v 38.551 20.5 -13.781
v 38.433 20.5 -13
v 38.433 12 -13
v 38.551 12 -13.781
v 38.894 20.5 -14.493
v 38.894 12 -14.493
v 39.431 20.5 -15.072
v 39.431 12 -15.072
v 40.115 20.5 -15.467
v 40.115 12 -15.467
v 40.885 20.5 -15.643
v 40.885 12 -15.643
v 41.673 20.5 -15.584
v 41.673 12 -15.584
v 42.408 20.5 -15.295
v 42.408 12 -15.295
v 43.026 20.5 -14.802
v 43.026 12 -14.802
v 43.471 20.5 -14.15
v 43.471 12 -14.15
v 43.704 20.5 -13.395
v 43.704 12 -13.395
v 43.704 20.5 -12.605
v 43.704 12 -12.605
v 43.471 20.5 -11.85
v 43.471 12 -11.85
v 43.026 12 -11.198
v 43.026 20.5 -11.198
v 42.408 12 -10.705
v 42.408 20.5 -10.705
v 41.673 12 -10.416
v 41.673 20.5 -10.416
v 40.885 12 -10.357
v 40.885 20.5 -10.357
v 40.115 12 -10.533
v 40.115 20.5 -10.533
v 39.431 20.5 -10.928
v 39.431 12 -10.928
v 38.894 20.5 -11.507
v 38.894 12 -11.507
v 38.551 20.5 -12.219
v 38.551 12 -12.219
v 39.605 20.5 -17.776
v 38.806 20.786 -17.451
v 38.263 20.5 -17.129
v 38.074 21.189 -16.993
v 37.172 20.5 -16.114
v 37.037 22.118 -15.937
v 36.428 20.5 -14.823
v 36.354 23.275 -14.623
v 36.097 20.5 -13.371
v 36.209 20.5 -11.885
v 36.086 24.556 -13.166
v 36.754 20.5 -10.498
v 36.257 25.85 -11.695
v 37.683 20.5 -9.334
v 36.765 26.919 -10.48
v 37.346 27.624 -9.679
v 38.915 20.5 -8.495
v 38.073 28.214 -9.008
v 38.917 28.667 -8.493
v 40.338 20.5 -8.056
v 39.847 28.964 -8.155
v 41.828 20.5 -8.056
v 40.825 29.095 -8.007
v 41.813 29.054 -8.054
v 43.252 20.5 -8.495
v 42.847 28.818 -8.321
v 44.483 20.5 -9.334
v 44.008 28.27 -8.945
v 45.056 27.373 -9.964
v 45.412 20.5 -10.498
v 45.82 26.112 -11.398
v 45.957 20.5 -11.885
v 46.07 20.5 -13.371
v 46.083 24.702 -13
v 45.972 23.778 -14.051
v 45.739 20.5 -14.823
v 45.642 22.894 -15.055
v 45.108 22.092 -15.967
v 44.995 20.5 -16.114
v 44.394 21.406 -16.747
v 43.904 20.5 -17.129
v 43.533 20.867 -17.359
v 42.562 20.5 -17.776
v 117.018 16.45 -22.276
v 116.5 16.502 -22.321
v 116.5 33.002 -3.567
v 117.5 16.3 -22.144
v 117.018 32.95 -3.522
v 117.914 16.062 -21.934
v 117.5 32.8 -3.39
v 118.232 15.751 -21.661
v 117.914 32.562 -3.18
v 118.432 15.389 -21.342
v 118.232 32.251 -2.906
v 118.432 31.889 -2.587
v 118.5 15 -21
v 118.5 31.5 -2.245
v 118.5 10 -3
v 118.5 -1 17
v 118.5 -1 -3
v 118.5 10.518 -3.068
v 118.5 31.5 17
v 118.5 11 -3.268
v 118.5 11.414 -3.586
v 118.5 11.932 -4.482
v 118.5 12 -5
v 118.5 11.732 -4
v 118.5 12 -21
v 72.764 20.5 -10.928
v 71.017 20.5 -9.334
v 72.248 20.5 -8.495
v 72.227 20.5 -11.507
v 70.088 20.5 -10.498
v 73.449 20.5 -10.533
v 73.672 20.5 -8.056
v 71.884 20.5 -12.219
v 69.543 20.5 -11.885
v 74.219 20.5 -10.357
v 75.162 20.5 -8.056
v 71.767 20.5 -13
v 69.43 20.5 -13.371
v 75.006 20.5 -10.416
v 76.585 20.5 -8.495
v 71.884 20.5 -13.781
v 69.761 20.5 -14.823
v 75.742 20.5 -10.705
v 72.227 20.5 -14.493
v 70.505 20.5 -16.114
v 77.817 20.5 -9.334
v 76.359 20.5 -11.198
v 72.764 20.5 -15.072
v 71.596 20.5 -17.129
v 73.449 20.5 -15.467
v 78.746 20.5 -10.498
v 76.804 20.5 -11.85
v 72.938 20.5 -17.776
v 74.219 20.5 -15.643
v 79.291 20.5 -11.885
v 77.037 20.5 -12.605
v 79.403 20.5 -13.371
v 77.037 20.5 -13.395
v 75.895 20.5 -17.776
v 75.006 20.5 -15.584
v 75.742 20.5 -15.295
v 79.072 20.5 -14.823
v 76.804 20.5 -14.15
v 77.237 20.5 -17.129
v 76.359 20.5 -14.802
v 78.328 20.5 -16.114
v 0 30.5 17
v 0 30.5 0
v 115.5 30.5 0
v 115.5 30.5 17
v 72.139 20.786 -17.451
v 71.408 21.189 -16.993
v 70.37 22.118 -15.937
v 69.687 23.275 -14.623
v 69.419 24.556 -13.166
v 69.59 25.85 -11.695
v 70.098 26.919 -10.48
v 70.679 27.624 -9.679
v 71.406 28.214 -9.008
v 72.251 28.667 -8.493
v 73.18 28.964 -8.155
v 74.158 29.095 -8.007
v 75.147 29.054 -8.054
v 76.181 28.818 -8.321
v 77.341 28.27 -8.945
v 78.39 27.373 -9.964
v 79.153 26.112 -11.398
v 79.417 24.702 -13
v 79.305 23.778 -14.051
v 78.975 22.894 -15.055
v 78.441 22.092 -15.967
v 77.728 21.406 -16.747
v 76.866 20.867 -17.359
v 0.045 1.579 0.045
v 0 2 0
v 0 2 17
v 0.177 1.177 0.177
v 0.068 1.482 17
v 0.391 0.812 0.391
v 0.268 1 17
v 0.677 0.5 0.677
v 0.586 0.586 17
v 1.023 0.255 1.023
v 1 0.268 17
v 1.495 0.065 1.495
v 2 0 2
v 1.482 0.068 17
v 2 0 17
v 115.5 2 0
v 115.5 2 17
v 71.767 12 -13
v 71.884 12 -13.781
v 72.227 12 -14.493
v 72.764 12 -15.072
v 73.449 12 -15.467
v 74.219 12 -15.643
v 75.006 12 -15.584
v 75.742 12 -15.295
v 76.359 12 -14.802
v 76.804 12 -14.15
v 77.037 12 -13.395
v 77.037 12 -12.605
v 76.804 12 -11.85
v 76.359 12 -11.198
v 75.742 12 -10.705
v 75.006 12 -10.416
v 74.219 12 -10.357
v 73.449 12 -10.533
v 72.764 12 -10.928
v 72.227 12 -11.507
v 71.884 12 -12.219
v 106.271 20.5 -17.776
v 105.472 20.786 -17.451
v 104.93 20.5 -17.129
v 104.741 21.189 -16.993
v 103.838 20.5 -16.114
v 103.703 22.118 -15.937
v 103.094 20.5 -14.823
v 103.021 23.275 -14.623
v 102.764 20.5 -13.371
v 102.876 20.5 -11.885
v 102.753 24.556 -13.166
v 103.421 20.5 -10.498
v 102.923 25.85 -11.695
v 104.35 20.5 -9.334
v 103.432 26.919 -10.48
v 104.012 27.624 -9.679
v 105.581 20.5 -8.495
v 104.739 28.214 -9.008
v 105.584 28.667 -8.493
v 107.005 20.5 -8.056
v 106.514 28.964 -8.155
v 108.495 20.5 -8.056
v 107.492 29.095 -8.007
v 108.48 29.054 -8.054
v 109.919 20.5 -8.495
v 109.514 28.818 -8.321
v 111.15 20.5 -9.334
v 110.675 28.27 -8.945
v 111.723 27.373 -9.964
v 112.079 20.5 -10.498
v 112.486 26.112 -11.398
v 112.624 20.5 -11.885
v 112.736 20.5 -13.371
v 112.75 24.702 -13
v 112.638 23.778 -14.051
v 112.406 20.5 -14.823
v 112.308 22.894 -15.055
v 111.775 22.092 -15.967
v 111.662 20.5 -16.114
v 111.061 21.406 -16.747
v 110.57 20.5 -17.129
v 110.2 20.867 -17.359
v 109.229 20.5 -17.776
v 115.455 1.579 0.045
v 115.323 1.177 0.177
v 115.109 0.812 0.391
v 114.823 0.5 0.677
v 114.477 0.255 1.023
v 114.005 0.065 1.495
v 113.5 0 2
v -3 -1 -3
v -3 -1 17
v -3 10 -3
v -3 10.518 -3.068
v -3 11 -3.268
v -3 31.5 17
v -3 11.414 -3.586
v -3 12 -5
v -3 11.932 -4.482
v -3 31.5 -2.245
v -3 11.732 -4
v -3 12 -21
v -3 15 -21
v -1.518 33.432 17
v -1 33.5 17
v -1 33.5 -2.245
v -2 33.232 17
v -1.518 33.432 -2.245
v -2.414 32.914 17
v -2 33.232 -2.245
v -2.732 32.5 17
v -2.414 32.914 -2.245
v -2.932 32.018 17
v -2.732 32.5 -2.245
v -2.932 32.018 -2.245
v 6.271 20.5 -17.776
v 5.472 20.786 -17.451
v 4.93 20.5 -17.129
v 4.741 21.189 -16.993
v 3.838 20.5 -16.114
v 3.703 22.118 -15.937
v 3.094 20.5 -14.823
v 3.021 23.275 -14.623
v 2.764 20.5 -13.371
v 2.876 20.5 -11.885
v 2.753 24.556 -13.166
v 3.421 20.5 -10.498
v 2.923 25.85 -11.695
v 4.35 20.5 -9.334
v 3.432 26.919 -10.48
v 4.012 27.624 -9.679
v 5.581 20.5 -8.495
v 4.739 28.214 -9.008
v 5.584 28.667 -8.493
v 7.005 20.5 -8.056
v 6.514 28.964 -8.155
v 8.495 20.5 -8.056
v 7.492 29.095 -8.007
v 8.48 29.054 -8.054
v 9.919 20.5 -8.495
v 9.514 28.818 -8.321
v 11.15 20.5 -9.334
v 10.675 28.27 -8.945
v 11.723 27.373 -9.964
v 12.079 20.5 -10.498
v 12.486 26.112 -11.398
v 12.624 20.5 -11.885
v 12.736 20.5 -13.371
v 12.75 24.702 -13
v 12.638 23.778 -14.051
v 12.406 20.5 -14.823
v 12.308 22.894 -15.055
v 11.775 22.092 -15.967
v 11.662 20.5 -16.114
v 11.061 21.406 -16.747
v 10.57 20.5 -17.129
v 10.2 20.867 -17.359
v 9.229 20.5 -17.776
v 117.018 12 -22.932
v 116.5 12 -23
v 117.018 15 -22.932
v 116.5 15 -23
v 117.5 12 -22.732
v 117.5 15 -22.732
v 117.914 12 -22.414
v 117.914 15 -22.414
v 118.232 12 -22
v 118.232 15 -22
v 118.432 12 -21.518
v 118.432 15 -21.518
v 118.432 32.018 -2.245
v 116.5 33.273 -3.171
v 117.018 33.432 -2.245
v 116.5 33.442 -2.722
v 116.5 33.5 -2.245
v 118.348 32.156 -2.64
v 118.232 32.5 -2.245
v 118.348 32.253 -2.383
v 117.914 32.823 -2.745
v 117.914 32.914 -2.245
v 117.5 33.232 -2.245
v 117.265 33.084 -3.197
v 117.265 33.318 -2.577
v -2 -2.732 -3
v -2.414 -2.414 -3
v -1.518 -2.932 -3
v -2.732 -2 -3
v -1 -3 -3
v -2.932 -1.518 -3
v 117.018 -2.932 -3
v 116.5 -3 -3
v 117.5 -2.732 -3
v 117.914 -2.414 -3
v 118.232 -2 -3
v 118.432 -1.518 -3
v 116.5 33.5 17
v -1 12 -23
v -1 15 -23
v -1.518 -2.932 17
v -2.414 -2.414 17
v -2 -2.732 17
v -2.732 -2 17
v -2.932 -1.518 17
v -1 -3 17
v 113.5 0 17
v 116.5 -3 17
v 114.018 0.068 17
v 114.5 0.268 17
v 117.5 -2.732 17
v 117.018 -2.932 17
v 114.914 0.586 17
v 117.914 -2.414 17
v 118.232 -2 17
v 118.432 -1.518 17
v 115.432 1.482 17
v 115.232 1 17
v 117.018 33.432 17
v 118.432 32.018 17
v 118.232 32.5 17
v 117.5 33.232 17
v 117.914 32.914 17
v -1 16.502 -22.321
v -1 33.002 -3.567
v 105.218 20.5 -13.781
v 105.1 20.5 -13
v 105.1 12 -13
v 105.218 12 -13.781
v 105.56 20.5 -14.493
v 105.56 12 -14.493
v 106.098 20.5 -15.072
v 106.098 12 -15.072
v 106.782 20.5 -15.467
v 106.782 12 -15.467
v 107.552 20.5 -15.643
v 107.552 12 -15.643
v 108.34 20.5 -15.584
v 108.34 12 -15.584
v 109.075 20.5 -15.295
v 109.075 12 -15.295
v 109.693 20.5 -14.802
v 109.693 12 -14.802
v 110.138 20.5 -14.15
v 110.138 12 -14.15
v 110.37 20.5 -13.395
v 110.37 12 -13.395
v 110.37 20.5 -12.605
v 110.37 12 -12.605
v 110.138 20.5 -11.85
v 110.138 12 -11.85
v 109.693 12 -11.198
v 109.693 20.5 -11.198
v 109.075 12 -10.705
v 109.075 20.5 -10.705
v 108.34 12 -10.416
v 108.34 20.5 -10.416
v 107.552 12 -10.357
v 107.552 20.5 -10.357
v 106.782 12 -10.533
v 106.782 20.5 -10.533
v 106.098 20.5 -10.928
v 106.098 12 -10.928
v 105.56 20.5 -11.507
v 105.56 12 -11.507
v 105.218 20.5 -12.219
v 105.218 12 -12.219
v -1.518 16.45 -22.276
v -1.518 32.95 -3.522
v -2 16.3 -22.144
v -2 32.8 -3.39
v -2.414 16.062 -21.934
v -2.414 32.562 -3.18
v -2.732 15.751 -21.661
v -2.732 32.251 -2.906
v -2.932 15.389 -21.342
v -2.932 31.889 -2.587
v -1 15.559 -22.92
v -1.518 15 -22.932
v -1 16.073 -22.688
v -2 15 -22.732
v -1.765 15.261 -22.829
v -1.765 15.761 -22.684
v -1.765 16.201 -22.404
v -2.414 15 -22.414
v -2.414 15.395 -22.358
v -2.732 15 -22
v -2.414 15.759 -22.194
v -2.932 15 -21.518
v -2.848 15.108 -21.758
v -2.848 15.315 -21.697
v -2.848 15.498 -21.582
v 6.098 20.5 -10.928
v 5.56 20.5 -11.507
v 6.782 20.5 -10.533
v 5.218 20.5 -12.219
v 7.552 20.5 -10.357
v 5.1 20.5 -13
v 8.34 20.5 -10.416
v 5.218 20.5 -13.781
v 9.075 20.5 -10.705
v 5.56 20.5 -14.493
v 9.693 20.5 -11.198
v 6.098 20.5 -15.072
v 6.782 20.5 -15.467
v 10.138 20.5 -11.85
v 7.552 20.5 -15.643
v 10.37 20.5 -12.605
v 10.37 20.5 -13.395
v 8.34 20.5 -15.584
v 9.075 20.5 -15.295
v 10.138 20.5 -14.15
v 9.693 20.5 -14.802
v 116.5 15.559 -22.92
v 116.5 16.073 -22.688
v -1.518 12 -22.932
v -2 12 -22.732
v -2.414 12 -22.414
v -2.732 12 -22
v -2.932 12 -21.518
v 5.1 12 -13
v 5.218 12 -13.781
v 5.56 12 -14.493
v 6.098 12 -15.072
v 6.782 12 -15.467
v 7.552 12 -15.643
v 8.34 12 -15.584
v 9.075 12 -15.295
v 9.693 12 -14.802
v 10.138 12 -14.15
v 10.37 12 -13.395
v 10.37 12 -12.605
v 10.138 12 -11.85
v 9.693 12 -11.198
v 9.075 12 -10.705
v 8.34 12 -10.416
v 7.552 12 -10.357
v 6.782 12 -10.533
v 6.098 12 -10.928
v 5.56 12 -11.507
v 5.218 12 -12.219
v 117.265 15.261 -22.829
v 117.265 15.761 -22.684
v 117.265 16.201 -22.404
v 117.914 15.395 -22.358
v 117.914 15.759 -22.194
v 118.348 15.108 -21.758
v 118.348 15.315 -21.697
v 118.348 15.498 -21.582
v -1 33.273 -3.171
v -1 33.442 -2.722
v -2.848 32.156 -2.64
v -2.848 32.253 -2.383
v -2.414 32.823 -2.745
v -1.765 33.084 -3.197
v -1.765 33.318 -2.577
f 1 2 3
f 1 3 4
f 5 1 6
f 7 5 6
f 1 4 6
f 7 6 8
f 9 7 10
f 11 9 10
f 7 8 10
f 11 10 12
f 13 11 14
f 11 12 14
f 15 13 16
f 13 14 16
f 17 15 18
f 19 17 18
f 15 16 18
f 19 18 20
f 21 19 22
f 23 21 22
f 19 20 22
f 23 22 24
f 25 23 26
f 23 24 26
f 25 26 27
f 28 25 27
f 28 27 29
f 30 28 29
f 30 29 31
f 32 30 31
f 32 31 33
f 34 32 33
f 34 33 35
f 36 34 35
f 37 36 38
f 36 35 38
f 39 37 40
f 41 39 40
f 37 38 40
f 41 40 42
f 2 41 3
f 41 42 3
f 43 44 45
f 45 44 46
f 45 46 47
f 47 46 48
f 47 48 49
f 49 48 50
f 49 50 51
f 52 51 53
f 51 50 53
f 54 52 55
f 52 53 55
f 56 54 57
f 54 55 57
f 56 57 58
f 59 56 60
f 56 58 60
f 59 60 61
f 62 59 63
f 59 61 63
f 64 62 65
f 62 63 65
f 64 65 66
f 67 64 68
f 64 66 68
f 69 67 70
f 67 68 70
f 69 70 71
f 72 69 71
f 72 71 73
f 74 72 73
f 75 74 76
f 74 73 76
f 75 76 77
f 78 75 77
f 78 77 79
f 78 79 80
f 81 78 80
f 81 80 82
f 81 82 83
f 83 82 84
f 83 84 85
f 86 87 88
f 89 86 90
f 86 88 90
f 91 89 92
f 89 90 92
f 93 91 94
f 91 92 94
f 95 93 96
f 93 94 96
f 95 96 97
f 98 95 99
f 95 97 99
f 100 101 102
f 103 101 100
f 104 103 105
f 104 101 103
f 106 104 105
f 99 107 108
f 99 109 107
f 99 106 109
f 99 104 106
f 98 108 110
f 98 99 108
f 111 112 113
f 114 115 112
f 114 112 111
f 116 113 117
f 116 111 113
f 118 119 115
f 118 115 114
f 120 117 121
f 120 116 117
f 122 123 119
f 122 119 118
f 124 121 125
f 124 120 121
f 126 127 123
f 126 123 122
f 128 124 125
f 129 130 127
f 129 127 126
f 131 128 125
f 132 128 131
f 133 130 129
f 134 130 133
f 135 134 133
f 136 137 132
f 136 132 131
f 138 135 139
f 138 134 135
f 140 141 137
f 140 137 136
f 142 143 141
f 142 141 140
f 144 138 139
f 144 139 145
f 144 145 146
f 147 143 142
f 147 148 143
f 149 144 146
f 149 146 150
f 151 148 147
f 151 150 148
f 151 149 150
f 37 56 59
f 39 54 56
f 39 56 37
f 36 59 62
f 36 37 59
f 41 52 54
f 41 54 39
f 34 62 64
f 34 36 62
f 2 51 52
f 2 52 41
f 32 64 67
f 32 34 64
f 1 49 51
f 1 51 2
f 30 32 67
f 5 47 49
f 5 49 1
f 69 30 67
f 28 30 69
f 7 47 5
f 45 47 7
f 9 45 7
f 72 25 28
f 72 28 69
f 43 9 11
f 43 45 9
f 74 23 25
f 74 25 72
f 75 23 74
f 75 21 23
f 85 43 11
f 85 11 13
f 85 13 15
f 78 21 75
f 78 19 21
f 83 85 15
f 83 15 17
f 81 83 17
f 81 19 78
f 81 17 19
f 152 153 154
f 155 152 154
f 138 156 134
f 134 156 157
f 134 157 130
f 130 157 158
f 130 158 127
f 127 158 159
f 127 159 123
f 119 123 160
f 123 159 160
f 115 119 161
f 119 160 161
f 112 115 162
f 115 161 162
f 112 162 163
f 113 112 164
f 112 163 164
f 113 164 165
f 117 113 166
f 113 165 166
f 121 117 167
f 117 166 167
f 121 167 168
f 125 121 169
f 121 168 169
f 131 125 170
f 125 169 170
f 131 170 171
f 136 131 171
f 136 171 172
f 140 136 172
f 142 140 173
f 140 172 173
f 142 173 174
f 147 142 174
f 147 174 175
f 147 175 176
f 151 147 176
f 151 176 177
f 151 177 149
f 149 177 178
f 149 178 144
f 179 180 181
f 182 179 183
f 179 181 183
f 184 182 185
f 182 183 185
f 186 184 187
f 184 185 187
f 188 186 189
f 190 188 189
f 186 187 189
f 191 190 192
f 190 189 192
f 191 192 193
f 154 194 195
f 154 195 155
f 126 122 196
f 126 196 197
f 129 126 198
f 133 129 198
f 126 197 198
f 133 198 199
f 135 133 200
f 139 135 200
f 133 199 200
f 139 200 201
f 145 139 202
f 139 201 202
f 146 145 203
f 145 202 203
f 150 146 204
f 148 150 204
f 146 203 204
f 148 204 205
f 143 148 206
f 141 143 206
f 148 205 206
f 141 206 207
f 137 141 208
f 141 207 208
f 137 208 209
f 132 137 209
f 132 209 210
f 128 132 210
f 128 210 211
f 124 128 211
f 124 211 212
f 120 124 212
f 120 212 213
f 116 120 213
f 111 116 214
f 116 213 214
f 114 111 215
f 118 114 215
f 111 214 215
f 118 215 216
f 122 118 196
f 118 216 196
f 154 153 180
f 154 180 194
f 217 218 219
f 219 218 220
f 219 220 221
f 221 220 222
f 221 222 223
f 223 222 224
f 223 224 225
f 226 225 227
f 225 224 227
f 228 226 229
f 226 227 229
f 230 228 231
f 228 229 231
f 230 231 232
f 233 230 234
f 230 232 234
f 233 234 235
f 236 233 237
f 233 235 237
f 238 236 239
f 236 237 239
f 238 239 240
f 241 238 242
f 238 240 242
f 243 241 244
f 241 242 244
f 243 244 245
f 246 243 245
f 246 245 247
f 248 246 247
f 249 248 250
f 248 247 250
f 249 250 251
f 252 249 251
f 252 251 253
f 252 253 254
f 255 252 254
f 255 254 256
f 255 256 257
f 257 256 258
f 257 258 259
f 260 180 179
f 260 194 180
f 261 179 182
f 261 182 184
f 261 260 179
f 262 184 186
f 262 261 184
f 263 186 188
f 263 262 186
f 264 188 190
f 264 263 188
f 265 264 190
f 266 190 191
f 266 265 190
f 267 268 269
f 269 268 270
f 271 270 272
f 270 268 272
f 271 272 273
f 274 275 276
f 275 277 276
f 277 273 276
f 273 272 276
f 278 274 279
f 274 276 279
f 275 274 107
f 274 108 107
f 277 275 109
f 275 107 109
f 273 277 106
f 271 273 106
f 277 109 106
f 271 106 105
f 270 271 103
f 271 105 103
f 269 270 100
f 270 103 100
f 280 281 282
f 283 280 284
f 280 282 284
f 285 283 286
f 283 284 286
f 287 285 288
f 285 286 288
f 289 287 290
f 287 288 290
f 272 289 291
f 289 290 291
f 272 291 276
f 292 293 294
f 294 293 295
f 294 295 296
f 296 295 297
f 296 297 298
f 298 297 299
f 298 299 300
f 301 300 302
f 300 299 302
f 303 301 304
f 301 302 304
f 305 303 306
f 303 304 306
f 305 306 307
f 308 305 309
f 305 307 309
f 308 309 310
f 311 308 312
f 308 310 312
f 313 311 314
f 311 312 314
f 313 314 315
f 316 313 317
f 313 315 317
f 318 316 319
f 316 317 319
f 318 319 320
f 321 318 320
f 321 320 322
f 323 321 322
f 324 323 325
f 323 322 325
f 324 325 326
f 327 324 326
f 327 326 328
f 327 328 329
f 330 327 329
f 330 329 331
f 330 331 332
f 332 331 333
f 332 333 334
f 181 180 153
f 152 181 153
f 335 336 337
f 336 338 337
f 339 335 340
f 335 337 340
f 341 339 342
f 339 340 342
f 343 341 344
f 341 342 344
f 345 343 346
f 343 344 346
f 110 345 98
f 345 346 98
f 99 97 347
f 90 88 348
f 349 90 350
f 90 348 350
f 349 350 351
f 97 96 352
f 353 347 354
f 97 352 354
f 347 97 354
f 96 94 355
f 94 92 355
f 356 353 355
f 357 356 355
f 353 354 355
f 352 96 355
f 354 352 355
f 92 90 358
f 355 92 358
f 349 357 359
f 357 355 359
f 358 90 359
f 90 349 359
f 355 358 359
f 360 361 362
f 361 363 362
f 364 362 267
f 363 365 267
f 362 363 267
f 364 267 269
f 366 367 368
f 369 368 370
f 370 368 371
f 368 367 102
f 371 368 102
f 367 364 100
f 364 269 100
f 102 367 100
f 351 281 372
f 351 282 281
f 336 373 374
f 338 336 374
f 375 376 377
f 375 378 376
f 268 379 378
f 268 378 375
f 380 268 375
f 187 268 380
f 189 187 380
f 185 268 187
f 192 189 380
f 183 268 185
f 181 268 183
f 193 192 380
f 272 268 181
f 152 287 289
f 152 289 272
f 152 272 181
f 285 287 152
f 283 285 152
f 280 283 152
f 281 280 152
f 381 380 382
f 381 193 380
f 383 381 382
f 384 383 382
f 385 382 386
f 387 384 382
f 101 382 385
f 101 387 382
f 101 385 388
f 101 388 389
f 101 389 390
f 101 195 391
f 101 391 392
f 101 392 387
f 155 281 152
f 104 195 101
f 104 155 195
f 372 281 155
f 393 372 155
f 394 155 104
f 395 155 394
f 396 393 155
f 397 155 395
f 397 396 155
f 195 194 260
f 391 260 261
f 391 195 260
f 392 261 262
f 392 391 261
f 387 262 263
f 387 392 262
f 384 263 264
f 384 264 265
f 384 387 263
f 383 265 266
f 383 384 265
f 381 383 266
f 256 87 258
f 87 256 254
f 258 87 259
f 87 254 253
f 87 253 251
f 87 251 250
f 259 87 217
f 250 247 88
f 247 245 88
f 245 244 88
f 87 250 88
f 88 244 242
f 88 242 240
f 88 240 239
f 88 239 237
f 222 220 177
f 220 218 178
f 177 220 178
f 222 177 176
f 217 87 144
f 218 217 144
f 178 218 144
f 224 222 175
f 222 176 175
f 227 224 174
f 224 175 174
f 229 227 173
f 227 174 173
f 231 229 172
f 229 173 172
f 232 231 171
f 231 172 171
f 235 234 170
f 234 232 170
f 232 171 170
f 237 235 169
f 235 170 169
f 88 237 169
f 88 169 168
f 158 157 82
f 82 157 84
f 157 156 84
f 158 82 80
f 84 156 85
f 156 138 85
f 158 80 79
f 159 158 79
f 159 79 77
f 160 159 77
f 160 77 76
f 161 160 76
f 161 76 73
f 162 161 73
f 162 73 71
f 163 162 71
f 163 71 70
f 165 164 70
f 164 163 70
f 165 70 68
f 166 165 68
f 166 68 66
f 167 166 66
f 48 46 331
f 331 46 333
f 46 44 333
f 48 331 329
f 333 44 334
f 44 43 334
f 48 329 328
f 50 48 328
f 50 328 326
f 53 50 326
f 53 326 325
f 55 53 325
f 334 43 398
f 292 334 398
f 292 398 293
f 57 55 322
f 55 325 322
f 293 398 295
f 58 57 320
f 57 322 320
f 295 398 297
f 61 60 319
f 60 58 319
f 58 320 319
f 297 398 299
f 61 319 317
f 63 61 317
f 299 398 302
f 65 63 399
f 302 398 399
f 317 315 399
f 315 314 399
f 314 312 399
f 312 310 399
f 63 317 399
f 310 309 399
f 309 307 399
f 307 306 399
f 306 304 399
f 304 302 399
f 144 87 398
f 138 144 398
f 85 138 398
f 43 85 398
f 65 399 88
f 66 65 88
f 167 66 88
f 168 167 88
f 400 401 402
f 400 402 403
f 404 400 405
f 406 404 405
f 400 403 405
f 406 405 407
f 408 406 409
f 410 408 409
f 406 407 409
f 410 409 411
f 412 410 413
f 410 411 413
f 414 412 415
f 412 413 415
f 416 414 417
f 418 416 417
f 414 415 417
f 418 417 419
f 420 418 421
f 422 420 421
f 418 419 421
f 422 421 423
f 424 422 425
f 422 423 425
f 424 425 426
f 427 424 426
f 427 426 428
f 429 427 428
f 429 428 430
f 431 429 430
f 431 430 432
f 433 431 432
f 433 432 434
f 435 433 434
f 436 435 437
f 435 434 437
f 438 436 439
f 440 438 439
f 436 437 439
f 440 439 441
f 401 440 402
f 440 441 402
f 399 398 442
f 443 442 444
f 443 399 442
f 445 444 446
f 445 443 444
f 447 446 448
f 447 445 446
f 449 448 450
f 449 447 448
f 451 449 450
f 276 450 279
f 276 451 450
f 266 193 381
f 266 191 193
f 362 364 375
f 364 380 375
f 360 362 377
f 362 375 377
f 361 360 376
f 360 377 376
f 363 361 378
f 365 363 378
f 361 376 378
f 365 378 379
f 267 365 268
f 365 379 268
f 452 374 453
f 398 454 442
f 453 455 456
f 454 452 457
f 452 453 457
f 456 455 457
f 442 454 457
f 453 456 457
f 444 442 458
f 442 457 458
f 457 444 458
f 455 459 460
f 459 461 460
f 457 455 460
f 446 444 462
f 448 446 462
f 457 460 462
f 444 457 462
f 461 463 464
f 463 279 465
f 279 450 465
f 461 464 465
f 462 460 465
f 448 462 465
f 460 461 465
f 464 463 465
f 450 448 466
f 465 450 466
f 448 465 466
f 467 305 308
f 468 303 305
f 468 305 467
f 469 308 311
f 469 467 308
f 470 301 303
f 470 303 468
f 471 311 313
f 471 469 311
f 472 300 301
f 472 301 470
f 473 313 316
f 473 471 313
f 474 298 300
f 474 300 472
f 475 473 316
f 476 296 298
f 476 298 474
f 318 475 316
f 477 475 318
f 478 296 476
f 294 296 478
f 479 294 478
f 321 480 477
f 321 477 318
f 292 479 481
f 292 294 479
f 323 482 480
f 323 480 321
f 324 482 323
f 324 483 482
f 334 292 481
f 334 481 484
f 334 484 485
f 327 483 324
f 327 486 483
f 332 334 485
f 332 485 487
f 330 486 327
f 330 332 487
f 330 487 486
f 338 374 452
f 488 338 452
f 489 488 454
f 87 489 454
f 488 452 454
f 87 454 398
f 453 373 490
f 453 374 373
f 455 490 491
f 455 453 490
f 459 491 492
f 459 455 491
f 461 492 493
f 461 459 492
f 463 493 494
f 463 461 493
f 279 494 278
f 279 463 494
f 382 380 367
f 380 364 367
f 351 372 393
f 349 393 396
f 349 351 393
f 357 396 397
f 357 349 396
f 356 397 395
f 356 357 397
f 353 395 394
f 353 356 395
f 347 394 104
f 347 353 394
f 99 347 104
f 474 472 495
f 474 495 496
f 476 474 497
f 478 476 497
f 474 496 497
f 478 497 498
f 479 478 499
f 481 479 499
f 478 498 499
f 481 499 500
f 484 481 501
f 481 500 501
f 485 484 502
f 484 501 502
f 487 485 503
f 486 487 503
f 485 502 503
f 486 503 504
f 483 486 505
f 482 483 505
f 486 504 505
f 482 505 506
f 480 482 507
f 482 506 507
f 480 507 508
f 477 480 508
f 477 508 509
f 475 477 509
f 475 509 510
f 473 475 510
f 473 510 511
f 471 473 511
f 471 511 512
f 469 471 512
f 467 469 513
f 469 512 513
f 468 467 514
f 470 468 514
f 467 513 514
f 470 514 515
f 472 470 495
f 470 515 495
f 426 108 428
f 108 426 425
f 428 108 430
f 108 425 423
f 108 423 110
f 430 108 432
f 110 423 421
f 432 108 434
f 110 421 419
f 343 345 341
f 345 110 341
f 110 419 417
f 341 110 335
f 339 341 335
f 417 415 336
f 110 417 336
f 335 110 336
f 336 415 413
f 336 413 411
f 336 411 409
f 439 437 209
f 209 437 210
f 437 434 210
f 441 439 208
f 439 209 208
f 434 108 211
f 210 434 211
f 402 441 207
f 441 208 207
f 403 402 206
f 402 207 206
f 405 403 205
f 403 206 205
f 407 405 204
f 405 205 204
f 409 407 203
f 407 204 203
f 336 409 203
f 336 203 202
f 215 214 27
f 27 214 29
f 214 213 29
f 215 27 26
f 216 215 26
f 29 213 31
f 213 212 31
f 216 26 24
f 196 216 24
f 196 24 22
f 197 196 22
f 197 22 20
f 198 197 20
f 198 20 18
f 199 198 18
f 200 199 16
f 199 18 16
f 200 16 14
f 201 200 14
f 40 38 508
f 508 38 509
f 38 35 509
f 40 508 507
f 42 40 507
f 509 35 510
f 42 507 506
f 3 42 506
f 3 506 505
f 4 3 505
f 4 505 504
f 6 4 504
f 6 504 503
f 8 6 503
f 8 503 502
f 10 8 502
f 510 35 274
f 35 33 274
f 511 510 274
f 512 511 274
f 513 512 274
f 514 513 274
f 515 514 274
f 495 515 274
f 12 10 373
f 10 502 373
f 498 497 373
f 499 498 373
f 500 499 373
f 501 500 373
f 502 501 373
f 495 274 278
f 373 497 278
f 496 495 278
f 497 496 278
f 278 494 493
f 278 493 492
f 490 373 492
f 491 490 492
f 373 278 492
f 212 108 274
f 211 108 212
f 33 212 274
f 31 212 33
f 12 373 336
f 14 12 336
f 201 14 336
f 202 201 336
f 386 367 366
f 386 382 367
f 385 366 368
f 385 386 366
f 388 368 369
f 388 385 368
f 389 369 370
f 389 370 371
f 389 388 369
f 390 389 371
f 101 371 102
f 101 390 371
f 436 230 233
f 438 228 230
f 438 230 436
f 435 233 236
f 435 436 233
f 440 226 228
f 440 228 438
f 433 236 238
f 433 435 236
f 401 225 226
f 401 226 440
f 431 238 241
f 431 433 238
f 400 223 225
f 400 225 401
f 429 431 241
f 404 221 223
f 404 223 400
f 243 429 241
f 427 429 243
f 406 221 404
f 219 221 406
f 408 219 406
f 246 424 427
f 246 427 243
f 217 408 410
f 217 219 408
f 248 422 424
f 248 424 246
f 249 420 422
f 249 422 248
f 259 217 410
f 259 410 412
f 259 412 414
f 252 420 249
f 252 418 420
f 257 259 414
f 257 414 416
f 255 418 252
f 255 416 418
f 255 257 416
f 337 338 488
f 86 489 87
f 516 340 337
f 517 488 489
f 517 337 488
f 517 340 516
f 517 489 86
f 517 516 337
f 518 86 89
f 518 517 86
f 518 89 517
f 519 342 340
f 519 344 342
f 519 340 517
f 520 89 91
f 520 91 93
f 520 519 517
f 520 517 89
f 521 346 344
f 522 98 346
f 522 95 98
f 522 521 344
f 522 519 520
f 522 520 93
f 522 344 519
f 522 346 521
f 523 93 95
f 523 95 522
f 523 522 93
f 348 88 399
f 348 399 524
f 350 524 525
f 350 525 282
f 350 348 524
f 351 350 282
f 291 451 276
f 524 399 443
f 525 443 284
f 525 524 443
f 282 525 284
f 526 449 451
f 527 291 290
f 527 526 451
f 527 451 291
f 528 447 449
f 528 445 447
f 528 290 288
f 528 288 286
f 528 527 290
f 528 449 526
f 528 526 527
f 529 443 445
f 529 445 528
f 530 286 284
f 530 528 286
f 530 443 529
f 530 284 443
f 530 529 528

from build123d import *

# Parameters (mm, degrees)
SKETCH1_W                      = 121.5
SKETCH1_H                      = 36.5
SKETCH1_W_2                    = 115.5
SKETCH1_H_2                    = 30.5
BOSS_EXTRUDE1_DEPTH            = 3
SKETCH1_3_W                    = 121.5
SKETCH1_3_H                    = 36.5
SKETCH1_3_W_2                  = 115.5
SKETCH1_3_H_2                  = 30.5
BOSS_EXTRUDE2_DEPTH            = 17
BOSS_EXTRUDE3_DEPTH            = 118.5
BOSS_EXTRUDE3_DEPTH_BACK       = 3
CBORE_FOR_M5_SHCS1_D           = 5.3
CBORE_FOR_M5_SHCS1_CBORE_D     = 10
CBORE_FOR_M5_SHCS1_CBORE_DEPTH = 13
FILLET1_R                      = 2


with BuildPart() as part:
    # Sketch1 → Boss-Extrude1 (new body)
    # profile 1 of 2: a face of its own
    with BuildSketch(Plane.XY):
        with Locations((57.75, 15.25)):
            Rectangle(SKETCH1_W, SKETCH1_H)
        with Locations((57.75, 15.25)):
            Rectangle(SKETCH1_W_2, SKETCH1_H_2, mode=Mode.SUBTRACT)
    # profile 2 of 2: a face of its own
    with BuildSketch(Plane.XY):
        with Locations((57.75, 15.25)):
            Rectangle(SKETCH1_W_2, SKETCH1_H_2)
    extrude(amount=-BOSS_EXTRUDE1_DEPTH)

    # Sketch1<3> → Boss-Extrude2 (add)
    with BuildSketch(Plane.XY):
        with Locations((57.75, 15.25)):
            Rectangle(SKETCH1_3_W, SKETCH1_3_H)
        with Locations((57.75, 15.25)):
            Rectangle(SKETCH1_3_W_2, SKETCH1_3_H_2, mode=Mode.SUBTRACT)
    extrude(amount=BOSS_EXTRUDE2_DEPTH)

    # Sketch2 → Boss-Extrude3 (add, two sides: drawn at the far end of the back side and taken through both)
    with BuildSketch(Plane(origin=(0, 0, 0), x_dir=(0, 0, -1), z_dir=(1, 0, 0)).offset(-BOSS_EXTRUDE3_DEPTH_BACK)):
        with BuildLine():
            Line((3, 33.5), (3, 12))
            Line((3, 12), (23, 12))
            Line((23, 12), (23, 15))
            ThreePointArc((23, 15), (22.822381628, 15.823969176), (22.321074797, 16.501586289))
            Line((22.321074797, 16.501586289), (3, 33.5))
        make_face()
    extrude(amount=BOSS_EXTRUDE3_DEPTH + BOSS_EXTRUDE3_DEPTH_BACK)

    # CBORE for M5 SHCS1 (through all)
    with Locations(Plane(origin=(0, 33.5, 0), x_dir=(1, 0, 0), z_dir=(0, 1, 0))):
        with Locations((7.75, 13), (41.083333333, 13), (74.416666667, 13), (107.75, 13)):
            CounterBoreHole(CBORE_FOR_M5_SHCS1_D / 2, CBORE_FOR_M5_SHCS1_CBORE_D / 2, CBORE_FOR_M5_SHCS1_CBORE_DEPTH)

    # Fillet1
    fillet1_edges = [part.edges().sort_by_distance(p)[0] for p in [
        (57.75, 33.5, -3),
        (57.75, 0, 0),
        (115.5, 0, 8.5),
        (0, 0, 8.5),
        (-3, 13.5, -23),
        (-3, 15.823969176, -22.822381628),
        (-3, 25.000793144, -12.660537398),
        (57.75, 12, -3),
        (118.5, 13.5, -23),
        (118.5, 15.823969176, -22.822381628),
        (118.5, 25.000793144, -12.660537398),
        (118.5, -3, 7),
        (-3, -3, 7),
        (-3, 33.5, 7),
        (118.5, 33.5, 7),
    ]]
    fillet(fillet1_edges, radius=FILLET1_R)


solid = part.part
